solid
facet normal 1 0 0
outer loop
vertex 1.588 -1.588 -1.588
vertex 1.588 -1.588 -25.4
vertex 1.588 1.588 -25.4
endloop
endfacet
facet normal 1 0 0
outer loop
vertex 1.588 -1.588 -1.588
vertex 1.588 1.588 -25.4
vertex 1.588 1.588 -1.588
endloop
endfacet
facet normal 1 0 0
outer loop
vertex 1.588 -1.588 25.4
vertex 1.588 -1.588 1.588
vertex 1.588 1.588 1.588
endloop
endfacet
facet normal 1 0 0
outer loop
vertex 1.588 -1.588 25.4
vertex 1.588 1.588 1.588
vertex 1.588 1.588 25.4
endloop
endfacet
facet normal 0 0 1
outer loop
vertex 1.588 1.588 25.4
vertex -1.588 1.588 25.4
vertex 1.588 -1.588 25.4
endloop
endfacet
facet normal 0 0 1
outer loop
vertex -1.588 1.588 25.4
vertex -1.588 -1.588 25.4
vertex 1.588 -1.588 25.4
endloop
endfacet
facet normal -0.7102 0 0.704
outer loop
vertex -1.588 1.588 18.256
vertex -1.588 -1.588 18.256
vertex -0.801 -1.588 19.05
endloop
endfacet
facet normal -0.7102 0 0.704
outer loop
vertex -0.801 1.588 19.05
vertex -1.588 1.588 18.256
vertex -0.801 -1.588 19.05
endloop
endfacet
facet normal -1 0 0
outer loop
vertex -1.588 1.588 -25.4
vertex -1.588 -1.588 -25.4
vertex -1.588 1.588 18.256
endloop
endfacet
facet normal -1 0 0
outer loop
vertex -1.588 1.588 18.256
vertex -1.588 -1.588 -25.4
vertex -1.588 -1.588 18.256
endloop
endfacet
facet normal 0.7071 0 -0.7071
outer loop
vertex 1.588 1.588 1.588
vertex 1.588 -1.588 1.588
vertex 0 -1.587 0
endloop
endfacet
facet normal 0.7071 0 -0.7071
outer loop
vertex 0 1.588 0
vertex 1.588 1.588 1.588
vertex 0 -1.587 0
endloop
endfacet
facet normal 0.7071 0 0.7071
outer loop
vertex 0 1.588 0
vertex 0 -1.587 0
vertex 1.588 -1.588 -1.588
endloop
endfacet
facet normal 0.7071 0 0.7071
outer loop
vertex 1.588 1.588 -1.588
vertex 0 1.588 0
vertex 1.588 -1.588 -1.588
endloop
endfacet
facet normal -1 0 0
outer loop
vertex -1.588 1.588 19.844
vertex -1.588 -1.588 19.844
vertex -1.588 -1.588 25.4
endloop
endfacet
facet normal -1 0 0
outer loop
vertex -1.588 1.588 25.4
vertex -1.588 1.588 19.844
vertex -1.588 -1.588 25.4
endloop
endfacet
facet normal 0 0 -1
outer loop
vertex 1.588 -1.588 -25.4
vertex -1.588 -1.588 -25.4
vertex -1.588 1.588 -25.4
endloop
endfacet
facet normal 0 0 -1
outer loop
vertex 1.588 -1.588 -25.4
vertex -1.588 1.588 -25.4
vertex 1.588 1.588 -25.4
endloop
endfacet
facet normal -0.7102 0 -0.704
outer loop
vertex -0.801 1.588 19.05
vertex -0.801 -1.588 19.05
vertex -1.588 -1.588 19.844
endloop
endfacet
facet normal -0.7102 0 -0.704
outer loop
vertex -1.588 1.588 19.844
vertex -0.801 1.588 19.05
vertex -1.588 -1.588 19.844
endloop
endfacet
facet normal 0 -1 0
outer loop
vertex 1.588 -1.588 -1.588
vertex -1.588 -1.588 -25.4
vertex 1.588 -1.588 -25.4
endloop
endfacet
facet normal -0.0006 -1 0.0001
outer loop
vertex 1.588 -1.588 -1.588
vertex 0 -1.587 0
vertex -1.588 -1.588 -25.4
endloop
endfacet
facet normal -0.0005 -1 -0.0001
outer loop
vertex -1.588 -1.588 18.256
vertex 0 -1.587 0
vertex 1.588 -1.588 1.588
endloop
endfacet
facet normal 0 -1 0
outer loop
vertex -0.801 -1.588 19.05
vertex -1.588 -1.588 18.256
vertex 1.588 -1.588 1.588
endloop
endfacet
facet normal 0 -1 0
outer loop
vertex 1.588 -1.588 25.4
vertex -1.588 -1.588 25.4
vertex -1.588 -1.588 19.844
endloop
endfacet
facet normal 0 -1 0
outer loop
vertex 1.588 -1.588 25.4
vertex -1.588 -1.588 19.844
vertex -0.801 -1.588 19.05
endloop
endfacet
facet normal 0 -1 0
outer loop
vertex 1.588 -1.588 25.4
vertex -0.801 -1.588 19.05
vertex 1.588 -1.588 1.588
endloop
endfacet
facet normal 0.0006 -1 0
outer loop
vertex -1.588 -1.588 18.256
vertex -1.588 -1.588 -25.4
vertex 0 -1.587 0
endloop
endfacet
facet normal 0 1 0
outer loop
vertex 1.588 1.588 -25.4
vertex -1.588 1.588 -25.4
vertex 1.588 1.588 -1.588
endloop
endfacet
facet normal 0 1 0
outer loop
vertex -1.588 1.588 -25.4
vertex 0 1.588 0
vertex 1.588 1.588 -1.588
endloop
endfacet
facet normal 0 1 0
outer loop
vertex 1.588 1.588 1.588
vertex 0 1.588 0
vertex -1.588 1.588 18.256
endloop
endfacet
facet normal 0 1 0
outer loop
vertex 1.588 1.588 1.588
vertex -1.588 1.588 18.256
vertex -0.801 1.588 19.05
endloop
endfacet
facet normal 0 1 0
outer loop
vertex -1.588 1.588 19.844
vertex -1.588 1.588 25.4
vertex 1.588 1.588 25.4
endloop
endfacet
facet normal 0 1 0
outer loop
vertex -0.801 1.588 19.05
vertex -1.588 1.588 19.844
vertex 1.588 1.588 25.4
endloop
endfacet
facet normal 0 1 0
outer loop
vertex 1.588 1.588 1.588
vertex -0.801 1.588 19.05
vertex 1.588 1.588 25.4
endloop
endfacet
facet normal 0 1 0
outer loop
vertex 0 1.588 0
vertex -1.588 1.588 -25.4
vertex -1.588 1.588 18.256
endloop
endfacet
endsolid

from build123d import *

# Parameters (mm, degrees)
F0_W     = 3.175
F0_H     = 50.8
F1_DEPTH = 1.5875
F3_DEPTH = 3.176
F5_DEPTH = 3.176
F7_DEPTH = 3.176


with BuildPart() as f1:
    # F0 (on Front) → F1 (new body, symmetric)
    with BuildSketch(Plane.XZ):
        Rectangle(F0_W, F0_H)
    extrude(amount=F1_DEPTH, both=True)

    # F2 (on face) → F3 (cut, through all)
    with BuildSketch(Plane.XZ.offset(1.5875)):
        Polygon((0, 0), (1.5875, 0), (1.5875, 1.5875), align=None)
    extrude(amount=-F3_DEPTH, mode=Mode.SUBTRACT)

    # F4 (on face) → F5 (cut, through all)
    with BuildSketch(Plane.XZ.offset(1.5875)):
        Polygon((1.5875, 0), (0, 0), (1.5875, -1.5875), align=None)
    extrude(amount=-F5_DEPTH, mode=Mode.SUBTRACT)

    # F6 (on face) → F7 (cut, through all)
    with BuildSketch(Plane.XZ.offset(1.5875)):
        Polygon((-1.5875, 18.25625), (-0.80074, 19.05), (-1.5875, 19.84375), align=None)
    extrude(amount=-F7_DEPTH, mode=Mode.SUBTRACT)


solid = f1.part
